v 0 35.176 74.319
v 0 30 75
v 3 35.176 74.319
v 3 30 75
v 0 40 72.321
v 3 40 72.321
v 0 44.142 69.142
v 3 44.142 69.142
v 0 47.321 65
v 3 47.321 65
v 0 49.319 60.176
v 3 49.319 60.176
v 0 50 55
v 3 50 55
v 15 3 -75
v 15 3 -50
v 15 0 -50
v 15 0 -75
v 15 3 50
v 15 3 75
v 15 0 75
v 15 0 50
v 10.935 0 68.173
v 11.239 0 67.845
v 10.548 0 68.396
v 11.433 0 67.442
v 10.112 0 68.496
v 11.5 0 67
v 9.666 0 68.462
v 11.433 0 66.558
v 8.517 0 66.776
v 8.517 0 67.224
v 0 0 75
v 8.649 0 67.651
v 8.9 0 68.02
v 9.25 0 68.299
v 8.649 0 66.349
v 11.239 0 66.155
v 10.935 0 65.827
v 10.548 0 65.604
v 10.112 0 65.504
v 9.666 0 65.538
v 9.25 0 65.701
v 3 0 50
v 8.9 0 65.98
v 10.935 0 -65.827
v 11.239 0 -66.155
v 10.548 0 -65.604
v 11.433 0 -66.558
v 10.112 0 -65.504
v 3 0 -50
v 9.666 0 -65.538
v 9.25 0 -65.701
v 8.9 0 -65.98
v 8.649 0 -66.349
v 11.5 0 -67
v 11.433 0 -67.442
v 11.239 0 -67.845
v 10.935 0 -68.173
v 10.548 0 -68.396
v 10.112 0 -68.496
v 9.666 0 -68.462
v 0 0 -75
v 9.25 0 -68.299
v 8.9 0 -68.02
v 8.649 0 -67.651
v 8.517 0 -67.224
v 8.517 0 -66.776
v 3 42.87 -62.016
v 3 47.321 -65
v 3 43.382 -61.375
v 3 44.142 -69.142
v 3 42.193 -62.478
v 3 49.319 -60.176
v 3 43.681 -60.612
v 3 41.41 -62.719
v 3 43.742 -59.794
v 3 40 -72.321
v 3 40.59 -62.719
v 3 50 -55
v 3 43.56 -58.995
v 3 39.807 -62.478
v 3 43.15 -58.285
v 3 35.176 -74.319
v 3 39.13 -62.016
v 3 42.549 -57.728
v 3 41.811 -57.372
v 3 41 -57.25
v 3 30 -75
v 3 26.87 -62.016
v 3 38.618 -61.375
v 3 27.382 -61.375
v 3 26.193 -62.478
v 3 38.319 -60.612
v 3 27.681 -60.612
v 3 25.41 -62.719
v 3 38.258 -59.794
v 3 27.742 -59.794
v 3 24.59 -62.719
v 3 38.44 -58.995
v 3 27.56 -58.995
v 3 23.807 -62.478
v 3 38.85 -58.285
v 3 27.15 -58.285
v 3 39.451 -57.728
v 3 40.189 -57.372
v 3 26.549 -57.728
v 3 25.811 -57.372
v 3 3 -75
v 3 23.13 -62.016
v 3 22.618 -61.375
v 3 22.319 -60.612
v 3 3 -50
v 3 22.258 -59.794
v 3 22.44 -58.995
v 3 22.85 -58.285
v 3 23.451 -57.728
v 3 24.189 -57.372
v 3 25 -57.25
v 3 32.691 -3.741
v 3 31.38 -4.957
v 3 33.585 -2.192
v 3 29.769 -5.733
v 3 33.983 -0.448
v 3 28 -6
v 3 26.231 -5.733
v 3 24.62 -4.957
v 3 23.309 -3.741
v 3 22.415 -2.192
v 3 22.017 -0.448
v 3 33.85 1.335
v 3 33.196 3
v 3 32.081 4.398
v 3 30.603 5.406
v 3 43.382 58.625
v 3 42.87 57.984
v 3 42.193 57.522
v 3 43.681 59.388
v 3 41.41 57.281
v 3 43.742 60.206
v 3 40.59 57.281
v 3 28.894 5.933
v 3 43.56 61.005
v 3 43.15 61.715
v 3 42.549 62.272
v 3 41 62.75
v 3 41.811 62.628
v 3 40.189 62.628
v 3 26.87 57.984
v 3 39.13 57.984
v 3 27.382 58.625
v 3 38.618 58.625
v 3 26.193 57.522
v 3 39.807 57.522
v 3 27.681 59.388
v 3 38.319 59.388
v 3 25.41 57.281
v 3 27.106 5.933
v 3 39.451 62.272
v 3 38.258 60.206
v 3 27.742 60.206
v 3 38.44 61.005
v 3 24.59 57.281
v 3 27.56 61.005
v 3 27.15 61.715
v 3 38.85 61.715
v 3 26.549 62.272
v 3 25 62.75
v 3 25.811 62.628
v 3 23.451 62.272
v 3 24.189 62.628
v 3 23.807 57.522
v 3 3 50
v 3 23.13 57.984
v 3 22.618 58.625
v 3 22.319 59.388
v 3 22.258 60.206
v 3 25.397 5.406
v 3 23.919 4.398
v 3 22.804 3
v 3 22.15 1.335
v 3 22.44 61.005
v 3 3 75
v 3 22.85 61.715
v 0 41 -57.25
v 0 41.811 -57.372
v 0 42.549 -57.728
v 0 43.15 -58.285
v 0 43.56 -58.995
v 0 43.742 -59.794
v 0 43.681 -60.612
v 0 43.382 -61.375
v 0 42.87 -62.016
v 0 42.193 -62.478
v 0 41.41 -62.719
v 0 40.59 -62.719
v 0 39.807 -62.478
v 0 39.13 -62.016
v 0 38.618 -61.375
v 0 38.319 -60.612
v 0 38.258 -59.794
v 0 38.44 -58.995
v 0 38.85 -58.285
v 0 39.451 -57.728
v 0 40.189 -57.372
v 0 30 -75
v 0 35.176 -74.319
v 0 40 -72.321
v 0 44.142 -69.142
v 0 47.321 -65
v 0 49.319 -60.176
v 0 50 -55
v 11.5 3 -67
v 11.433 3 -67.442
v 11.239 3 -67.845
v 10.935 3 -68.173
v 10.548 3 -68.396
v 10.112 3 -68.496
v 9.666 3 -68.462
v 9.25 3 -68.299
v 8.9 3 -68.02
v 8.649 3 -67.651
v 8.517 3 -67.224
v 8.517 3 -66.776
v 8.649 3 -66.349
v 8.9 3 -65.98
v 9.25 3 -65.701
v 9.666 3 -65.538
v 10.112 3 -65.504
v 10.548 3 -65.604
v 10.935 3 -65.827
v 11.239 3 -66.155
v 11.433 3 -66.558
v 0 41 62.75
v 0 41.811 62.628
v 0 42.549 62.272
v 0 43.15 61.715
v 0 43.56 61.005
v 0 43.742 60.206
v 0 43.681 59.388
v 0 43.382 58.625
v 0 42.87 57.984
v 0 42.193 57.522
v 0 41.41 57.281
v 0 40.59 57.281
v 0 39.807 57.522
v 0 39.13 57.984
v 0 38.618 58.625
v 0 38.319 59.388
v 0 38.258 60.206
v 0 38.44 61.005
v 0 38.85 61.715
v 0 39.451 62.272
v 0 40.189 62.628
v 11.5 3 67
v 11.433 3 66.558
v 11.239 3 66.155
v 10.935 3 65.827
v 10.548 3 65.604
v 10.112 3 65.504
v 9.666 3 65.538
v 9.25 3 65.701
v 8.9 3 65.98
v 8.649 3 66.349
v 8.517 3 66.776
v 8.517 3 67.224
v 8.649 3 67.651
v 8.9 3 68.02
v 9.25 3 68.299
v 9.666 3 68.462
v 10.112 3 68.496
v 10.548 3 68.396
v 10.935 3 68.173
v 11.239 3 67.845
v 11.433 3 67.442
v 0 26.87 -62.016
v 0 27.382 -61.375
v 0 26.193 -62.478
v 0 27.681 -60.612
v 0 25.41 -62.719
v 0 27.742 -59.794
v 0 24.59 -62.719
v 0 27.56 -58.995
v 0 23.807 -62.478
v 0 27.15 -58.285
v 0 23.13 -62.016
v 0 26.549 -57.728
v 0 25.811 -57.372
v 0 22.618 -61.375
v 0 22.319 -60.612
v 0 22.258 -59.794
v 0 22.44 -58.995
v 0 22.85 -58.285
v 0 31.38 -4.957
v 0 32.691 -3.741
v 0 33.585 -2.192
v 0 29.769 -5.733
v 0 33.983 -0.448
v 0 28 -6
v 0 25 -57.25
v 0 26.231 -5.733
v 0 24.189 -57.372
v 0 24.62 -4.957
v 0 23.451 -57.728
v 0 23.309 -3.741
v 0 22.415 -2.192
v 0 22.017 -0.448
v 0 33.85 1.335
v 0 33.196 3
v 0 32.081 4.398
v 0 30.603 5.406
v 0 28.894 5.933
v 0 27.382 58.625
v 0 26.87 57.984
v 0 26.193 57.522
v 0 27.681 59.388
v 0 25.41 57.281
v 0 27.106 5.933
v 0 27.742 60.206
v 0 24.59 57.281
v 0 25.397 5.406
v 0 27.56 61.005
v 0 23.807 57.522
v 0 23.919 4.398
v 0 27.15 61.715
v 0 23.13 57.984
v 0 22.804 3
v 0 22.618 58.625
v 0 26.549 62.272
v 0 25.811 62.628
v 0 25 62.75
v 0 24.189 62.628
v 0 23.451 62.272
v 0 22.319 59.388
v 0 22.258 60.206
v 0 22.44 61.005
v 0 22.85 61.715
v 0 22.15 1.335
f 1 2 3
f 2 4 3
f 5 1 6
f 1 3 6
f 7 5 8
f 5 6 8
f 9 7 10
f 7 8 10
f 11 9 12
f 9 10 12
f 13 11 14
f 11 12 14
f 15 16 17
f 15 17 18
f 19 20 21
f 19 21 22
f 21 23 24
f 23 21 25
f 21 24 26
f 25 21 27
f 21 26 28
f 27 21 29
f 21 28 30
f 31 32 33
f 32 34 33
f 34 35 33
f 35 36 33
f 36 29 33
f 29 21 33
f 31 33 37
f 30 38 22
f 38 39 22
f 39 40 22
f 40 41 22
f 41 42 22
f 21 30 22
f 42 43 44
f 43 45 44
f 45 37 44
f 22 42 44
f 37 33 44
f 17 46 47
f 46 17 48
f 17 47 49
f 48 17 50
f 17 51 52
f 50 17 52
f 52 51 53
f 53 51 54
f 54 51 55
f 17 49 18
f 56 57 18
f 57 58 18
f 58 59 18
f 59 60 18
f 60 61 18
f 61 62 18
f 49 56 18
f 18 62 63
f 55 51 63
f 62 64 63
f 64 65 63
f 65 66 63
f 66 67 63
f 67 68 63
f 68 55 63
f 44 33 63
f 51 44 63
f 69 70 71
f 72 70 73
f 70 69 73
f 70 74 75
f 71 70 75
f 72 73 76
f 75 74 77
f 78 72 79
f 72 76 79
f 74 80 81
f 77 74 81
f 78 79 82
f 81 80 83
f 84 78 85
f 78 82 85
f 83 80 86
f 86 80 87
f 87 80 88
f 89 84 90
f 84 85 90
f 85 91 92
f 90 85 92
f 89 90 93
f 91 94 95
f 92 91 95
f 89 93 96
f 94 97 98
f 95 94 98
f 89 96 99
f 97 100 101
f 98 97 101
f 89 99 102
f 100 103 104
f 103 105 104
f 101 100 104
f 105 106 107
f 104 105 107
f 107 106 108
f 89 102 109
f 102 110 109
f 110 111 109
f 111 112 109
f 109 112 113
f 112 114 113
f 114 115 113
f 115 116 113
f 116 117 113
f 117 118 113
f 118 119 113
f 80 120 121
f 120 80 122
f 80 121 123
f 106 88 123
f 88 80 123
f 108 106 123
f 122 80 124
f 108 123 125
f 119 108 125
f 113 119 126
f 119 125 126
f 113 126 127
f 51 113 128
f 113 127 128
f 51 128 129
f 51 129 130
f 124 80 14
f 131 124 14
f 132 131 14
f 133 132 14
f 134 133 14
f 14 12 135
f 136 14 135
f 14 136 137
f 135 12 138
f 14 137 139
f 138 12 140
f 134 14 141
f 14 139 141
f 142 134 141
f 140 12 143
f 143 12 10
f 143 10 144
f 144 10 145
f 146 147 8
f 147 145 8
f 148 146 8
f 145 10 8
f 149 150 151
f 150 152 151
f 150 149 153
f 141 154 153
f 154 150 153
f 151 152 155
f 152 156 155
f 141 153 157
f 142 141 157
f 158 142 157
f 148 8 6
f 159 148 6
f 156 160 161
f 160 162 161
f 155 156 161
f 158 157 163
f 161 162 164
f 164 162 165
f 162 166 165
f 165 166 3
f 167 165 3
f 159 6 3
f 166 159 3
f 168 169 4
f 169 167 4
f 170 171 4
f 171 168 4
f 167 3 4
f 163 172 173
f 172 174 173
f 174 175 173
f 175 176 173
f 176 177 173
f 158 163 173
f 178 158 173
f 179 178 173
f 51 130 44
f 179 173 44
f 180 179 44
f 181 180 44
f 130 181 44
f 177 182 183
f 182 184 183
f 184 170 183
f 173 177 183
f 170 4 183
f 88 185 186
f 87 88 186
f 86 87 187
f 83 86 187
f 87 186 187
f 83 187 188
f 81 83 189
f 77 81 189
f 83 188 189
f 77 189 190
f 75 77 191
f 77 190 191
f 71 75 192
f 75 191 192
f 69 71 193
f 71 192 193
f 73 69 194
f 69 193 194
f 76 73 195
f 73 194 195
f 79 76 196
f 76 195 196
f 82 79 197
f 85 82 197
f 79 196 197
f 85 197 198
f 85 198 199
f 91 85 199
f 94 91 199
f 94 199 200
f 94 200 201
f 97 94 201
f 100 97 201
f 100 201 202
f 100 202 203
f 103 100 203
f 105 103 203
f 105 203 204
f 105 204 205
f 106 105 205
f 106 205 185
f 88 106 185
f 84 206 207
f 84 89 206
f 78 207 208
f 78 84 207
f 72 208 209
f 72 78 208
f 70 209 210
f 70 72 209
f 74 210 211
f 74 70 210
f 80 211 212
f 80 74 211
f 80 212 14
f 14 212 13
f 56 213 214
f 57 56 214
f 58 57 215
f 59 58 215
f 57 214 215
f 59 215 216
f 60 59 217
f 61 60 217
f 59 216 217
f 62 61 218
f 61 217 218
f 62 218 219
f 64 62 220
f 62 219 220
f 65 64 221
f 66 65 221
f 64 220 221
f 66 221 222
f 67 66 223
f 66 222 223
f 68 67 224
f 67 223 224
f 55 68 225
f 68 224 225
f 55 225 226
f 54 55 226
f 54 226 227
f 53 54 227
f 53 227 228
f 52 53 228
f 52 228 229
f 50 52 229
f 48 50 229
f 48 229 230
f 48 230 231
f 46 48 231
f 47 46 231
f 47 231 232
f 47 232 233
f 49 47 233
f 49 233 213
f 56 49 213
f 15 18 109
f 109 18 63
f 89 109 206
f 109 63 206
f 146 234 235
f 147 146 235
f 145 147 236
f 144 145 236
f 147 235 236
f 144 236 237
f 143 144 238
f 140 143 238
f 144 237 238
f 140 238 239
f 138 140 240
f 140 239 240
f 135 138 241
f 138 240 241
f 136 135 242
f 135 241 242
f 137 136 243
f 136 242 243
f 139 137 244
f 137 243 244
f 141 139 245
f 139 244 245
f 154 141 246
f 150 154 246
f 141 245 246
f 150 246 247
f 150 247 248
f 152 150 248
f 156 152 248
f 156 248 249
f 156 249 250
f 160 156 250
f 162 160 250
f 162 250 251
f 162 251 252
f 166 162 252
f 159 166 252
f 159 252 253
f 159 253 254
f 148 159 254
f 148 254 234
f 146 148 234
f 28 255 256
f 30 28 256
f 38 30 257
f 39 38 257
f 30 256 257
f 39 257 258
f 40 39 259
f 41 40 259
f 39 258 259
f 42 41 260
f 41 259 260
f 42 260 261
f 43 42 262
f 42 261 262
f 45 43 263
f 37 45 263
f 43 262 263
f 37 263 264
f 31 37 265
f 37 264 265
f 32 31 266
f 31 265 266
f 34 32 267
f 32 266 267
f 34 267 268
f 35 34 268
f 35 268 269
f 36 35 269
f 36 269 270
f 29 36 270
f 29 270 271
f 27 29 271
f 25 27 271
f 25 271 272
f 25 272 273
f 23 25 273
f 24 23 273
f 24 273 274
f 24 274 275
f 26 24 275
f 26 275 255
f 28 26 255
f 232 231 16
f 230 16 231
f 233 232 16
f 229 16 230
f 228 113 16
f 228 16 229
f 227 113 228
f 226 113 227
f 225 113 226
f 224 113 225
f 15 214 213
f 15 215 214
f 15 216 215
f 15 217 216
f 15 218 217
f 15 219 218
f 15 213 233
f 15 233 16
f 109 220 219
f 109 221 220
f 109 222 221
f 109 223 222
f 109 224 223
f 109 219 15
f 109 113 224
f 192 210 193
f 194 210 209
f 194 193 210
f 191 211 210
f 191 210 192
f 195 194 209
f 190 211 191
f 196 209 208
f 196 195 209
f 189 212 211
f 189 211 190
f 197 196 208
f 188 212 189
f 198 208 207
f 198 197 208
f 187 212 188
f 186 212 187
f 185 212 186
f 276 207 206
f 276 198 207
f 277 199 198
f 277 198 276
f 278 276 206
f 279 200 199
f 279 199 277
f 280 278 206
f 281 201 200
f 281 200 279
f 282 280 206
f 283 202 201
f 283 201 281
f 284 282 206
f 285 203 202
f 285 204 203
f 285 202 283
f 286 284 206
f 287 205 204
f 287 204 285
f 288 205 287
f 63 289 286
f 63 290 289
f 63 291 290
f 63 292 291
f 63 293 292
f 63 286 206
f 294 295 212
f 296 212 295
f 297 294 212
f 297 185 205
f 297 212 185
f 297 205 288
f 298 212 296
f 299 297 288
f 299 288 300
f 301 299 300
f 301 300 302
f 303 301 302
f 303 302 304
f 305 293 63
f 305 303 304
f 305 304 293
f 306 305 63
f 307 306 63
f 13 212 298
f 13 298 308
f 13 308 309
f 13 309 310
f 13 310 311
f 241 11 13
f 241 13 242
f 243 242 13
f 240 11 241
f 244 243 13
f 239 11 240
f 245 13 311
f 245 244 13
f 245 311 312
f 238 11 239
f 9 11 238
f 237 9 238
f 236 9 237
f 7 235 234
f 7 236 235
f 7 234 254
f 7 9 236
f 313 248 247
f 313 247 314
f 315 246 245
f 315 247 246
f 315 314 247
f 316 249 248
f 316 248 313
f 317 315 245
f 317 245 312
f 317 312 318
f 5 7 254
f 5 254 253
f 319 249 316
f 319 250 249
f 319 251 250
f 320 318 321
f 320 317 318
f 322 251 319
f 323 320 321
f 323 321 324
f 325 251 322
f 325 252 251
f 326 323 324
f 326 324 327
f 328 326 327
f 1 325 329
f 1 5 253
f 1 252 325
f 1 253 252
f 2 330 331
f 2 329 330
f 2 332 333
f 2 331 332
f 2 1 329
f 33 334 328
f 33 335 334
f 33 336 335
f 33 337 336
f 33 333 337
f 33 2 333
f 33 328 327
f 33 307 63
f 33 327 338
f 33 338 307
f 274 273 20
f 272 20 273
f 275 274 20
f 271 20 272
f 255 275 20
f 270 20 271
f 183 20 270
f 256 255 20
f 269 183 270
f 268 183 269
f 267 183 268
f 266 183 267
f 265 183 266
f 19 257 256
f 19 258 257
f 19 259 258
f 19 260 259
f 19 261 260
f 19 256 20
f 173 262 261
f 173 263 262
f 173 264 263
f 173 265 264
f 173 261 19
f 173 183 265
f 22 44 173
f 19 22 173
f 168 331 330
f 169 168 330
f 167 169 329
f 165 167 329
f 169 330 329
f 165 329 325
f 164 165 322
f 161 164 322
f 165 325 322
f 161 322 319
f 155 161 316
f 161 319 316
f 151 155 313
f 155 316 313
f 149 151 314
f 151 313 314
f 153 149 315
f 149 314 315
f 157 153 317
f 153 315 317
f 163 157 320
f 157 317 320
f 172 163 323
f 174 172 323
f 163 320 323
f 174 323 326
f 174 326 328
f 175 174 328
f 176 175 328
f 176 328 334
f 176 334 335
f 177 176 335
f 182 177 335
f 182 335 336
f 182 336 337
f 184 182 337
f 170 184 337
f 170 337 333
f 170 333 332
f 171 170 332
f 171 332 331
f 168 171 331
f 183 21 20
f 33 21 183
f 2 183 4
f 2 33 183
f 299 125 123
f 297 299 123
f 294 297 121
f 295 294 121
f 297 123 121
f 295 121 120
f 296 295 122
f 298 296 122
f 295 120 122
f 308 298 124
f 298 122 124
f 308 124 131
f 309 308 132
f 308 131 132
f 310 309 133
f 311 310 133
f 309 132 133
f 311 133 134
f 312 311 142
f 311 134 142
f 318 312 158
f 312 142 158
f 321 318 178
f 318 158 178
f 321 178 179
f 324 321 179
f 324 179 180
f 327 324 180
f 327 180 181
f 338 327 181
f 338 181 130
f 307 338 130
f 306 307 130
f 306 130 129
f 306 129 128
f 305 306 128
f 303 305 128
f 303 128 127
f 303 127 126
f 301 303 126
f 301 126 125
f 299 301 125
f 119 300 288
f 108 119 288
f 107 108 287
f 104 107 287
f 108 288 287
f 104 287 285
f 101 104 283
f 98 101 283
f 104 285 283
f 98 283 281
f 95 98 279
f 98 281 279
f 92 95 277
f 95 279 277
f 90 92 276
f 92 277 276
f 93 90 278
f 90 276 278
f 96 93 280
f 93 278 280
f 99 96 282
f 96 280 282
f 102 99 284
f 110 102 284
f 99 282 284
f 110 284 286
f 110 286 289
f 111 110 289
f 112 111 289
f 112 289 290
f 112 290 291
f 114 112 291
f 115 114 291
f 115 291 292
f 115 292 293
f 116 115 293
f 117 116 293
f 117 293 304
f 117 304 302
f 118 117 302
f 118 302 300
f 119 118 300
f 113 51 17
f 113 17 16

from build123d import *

# Parameters (mm, degrees)
SKETCH_1_W                  = 50
SKETCH_1_H                  = 150
EXTRUDE_1_DEPTH             = 3
SKETCH_2_W                  = 25
SKETCH_2_H                  = 3
EXTRUDE_2_DEPTH             = 12
SKETCH_3_W                  = 25
SKETCH_3_H                  = 3
EXTRUDE_3_DEPTH             = 12
HOLE_WIZARD_3_0_3_1_D       = 3
HOLE_WIZARD_3_0_3_1_DEPTH   = 50.000025
HOLE_WIZARD_5_5_5_5_1_D     = 5.5
HOLE_WIZARD_12_0_12_1_D     = 12
HOLE_WIZARD_12_0_12_1_DEPTH = 15.000025
FILLET_1_R                  = 20


with BuildPart() as part:
    # ｽｹｯﾁ1 → ﾎﾞｽ - 押し出し1 (new body)
    with BuildSketch(Plane(origin=(0, 0, 0), x_dir=(0, -1, 0), z_dir=(-1, 0, 0))):
        with Locations((-25, 0)):
            Rectangle(SKETCH_1_W, SKETCH_1_H)
    extrude(amount=-EXTRUDE_1_DEPTH)

    # ｽｹｯﾁ2 → ﾎﾞｽ - 押し出し2 (add)
    with BuildSketch(Plane(origin=(3, 0, 0), x_dir=(0, 0, -1), z_dir=(1, 0, 0))):
        with Locations((-62.5, 1.5)):
            Rectangle(SKETCH_2_W, SKETCH_2_H)
    extrude(amount=EXTRUDE_2_DEPTH)

    # ｽｹｯﾁ3 → ﾎﾞｽ - 押し出し3 (add)
    with BuildSketch(Plane(origin=(3, 0, 0), x_dir=(0, 0, -1), z_dir=(1, 0, 0))):
        with Locations((62.5, 1.5)):
            Rectangle(SKETCH_3_W, SKETCH_3_H)
    extrude(amount=EXTRUDE_3_DEPTH)

    # Ø3.0 (3) 直径の穴1
    with Locations(Plane(origin=(0, 0, 0), x_dir=(-1, 0, 0), z_dir=(0, -1, 0))):
        with Locations((-10, -67), (-10, 67)):
            Hole(HOLE_WIZARD_3_0_3_1_D / 2, depth=HOLE_WIZARD_3_0_3_1_DEPTH)

    # Ø5.5 (5.5) 直径の穴1 (through all)
    with Locations(Plane(origin=(3, 0, 0), x_dir=(0, 0, -1), z_dir=(1, 0, 0))):
        with Locations((60, 41), (-60, 41), (-60, 25), (60, 25)):
            Hole(HOLE_WIZARD_5_5_5_5_1_D / 2)

    # Ø12.0 (12) 直径の穴1
    with Locations(Plane.ZY):
        with Locations((0, 28)):
            Hole(HOLE_WIZARD_12_0_12_1_D / 2, depth=HOLE_WIZARD_12_0_12_1_DEPTH)

    # ﾌｨﾚｯﾄ1
    fillet_1_edges = [part.edges().sort_by_distance(p)[0] for p in [
        (1.5, 50, -75),
        (1.5, 50, 75),
    ]]
    fillet(fillet_1_edges, radius=FILLET_1_R)


solid = part.part
